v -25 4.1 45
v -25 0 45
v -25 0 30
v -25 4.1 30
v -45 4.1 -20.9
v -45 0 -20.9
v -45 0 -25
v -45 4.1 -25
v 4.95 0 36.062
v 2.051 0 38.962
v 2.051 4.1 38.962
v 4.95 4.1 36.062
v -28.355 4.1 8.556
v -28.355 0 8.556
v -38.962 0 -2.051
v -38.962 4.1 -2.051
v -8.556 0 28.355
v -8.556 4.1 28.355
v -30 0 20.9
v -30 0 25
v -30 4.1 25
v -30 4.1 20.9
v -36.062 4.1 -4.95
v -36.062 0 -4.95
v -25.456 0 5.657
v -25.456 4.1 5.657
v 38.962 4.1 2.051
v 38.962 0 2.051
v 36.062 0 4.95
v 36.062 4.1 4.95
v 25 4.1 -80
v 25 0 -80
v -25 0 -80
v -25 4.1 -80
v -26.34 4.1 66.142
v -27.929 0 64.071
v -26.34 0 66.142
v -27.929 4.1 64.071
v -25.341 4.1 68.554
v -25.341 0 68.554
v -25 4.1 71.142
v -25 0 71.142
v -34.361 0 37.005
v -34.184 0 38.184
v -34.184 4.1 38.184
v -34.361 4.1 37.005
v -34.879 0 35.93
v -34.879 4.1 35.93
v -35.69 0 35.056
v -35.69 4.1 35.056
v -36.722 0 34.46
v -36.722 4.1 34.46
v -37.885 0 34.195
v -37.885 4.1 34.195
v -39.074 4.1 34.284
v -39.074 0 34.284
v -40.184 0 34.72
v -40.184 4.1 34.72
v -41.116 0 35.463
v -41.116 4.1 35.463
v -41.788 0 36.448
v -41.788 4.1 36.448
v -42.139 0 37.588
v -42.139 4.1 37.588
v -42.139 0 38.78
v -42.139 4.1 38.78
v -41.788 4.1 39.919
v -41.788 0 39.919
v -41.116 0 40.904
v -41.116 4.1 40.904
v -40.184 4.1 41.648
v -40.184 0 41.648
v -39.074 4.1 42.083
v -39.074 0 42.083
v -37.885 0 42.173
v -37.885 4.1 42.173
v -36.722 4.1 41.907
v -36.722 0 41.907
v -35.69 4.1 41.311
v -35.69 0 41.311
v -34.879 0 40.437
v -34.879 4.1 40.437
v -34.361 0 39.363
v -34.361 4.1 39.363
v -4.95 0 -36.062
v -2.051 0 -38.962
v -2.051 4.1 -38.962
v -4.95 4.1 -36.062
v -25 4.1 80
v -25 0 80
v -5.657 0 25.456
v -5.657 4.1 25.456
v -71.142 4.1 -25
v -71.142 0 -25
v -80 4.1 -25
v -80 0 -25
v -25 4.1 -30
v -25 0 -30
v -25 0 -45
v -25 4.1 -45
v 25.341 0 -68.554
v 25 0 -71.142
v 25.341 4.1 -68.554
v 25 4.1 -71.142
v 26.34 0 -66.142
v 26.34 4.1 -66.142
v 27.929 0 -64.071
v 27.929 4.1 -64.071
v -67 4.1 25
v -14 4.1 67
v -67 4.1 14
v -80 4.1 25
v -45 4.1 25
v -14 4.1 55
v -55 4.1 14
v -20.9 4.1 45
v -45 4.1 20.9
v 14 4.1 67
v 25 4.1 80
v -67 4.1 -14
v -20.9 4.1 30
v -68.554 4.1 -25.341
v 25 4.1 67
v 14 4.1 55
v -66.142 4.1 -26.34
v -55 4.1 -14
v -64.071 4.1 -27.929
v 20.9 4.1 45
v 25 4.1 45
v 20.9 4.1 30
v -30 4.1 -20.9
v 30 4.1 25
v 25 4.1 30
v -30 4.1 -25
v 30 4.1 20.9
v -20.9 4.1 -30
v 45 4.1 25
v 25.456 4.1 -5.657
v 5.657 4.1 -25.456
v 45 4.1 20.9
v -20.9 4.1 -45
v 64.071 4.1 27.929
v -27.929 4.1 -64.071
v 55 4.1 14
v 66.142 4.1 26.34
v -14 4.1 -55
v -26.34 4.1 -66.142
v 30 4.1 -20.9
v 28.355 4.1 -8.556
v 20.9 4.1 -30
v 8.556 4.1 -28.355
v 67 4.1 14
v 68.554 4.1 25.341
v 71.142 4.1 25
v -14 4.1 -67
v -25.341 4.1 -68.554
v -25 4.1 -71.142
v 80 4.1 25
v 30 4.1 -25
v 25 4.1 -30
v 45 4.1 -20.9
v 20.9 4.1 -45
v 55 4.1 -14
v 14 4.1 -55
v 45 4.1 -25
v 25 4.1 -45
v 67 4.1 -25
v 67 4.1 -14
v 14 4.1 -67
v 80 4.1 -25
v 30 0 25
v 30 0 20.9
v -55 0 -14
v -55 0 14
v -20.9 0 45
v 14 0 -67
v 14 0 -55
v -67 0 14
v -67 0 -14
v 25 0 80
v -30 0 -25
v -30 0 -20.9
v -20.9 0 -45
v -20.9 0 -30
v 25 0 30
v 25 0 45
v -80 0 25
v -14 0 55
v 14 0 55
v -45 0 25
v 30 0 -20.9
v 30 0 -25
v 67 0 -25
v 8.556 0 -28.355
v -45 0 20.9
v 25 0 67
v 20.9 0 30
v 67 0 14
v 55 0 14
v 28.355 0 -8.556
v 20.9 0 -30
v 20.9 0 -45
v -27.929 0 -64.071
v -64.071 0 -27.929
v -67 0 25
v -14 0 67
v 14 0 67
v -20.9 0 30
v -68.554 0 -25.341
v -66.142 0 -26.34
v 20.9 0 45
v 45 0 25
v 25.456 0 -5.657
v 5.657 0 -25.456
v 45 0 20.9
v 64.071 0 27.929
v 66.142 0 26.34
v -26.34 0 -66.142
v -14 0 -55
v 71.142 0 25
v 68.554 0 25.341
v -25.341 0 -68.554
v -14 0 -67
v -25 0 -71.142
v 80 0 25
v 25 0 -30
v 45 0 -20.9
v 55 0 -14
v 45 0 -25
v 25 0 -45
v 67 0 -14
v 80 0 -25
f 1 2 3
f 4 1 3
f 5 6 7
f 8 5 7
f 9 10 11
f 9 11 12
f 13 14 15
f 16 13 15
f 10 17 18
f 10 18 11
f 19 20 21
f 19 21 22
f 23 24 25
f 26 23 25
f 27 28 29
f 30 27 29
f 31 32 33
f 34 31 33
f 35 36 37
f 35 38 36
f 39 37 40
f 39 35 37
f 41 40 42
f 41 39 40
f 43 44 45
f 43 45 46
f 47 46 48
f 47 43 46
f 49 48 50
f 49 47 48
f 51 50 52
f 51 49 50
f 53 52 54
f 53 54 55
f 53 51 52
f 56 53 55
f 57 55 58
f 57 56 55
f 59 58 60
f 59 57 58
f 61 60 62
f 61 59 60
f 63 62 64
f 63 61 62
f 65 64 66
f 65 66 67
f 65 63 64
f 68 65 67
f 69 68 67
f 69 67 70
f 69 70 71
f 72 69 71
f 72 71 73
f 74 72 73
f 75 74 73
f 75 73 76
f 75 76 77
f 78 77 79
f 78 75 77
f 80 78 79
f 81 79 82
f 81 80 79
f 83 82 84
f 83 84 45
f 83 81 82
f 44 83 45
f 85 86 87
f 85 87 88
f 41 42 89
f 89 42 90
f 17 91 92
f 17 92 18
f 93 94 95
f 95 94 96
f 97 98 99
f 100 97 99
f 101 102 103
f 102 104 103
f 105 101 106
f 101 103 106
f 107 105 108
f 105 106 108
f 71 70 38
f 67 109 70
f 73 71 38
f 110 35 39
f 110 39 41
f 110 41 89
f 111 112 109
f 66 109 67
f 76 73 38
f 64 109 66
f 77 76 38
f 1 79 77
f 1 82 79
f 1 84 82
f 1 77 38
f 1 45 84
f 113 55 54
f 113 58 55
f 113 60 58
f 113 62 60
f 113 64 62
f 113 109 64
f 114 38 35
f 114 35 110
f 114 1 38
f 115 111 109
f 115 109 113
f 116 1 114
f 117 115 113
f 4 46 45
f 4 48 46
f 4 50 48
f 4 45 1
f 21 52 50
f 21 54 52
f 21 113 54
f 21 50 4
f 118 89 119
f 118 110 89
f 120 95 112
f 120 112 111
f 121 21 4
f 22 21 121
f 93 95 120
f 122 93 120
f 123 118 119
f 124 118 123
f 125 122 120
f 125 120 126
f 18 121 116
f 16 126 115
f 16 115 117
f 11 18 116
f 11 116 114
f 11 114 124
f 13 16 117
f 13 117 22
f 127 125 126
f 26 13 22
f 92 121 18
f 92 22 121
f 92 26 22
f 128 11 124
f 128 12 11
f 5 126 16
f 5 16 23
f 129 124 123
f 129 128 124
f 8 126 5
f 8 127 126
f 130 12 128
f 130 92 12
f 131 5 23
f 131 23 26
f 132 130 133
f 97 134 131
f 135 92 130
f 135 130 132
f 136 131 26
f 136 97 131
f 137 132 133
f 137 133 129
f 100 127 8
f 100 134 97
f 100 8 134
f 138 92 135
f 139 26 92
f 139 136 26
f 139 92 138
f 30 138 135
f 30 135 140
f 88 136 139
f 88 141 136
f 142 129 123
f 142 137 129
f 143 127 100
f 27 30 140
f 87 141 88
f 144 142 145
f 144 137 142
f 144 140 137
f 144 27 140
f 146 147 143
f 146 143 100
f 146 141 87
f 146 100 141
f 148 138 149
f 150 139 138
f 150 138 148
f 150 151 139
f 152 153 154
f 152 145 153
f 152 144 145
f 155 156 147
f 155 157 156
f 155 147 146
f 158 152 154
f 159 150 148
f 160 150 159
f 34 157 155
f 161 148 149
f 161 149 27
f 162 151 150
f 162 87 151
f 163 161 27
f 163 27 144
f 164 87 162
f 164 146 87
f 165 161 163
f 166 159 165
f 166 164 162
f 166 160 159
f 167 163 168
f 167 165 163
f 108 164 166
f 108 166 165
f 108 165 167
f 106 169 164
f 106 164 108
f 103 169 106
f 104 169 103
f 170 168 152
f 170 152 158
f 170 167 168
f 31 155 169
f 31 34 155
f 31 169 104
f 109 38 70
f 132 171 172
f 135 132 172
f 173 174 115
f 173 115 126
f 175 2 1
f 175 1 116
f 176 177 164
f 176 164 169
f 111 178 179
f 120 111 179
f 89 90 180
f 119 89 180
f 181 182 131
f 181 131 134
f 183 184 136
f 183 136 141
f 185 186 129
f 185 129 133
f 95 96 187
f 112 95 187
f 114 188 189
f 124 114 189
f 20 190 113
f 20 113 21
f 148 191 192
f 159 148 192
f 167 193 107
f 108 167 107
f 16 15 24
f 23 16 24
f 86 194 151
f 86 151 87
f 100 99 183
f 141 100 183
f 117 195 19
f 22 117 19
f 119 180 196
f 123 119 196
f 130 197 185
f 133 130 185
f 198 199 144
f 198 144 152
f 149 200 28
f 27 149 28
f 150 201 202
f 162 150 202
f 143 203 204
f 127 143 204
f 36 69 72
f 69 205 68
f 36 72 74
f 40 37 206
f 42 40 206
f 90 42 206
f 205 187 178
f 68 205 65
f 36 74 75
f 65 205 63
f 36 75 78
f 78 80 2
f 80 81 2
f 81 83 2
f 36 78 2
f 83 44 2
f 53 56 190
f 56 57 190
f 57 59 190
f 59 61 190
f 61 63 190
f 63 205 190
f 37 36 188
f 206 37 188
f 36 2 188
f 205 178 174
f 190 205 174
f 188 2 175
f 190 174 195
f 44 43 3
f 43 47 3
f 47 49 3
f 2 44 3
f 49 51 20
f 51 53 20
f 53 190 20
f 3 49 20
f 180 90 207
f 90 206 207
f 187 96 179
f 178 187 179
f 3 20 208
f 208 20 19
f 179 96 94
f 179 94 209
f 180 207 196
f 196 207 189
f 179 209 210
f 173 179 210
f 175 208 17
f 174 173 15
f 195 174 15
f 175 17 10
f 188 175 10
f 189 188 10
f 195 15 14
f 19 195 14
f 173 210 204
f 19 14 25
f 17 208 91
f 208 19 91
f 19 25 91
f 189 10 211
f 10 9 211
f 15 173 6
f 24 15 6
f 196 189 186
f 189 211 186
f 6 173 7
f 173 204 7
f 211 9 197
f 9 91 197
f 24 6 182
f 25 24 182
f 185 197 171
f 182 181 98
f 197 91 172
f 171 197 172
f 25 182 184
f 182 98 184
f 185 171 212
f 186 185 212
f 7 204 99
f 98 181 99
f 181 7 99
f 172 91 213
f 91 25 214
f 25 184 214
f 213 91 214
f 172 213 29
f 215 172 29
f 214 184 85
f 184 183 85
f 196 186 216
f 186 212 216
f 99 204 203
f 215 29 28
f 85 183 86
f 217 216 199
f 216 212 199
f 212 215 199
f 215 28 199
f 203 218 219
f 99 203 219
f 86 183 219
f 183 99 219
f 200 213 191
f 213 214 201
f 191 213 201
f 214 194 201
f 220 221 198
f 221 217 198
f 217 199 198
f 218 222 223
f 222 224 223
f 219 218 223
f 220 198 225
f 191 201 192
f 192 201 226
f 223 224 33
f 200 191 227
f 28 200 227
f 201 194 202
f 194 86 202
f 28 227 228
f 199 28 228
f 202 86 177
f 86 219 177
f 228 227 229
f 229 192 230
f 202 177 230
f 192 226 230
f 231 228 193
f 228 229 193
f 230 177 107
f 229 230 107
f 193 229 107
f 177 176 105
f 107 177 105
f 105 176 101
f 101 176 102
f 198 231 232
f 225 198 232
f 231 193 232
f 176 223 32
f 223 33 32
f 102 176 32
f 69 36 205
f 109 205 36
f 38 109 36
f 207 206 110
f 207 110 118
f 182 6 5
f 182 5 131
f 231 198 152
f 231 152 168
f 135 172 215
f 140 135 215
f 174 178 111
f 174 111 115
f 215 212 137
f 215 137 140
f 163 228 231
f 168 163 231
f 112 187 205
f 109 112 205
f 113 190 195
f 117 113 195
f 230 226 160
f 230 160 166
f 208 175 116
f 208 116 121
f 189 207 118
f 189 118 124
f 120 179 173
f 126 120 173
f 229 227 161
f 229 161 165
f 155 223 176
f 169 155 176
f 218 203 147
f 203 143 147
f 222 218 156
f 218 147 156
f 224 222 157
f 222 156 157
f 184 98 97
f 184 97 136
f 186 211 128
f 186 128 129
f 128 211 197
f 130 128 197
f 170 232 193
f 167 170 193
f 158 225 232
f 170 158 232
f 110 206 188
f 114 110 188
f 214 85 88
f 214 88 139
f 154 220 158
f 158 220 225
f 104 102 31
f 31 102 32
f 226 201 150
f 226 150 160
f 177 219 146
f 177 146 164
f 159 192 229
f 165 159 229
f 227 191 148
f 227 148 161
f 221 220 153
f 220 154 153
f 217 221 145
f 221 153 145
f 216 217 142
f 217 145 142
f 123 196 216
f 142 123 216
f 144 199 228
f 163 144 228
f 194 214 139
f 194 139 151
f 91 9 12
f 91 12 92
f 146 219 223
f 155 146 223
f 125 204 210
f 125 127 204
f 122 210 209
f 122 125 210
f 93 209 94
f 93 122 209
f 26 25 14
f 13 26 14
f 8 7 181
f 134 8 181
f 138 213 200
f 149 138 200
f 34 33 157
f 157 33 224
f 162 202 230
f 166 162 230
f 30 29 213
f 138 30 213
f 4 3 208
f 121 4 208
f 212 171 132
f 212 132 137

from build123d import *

# Parameters (mm, degrees)
SKETCH1_R           = 4
SKETCH1_W           = 4.1
SKETCH1_H           = 15
SKETCH1_W_2         = 15
SKETCH1_H_2         = 4.1
SKETCH1_W_3         = 12
SKETCH1_H_3         = 28
SKETCH1_W_4         = 28
SKETCH1_H_4         = 12
BOSS_EXTRUDE1_DEPTH = 4.1
FILLET4_R           = 10


with BuildPart() as part:
    # Sketch1 → Boss-Extrude1 (new body)
    with BuildSketch(Plane(origin=(0, 0, 0), x_dir=(1, 0, 0), z_dir=(0, 1, 0))):
        Polygon((-25, 67), (-67, 25), (-80, 25), (-80, -25), (-67, -25), (-25, -67), (-25, -80), (25, -80), (25, -67), (67, -25), (80, -25), (80, 25), (67, 25), (25, 67), (25, 80), (-25, 80), align=None)
        with Locations((-38.183766184, -38.183766184)):
            Circle(SKETCH1_R, mode=Mode.SUBTRACT)
        with Locations((-22.95, 37.5)):
            Rectangle(SKETCH1_W, SKETCH1_H, mode=Mode.SUBTRACT)
        with Locations((-37.5, 22.95)):
            Rectangle(SKETCH1_W_2, SKETCH1_H_2, mode=Mode.SUBTRACT)
        with Locations((37.5, -22.95)):
            Rectangle(SKETCH1_W_2, SKETCH1_H_2, mode=Mode.SUBTRACT)
        with Locations((22.95, -37.5)):
            Rectangle(SKETCH1_W, SKETCH1_H, mode=Mode.SUBTRACT)
        with Locations((37.5, 22.95)):
            Rectangle(SKETCH1_W_2, SKETCH1_H_2, mode=Mode.SUBTRACT)
        with Locations((-37.5, -22.95)):
            Rectangle(SKETCH1_W_2, SKETCH1_H_2, mode=Mode.SUBTRACT)
        with Locations((22.95, 37.5)):
            Rectangle(SKETCH1_W, SKETCH1_H, mode=Mode.SUBTRACT)
        with Locations((-22.95, -37.5)):
            Rectangle(SKETCH1_W, SKETCH1_H, mode=Mode.SUBTRACT)
        Polygon((-36.062445841, 4.949747468), (-25.455844123, -5.656854249), (-28.354981926, -8.555992052), (-38.961583643, 2.050609665), align=None, mode=Mode.SUBTRACT)
        Polygon((-8.555992052, -28.354981926), (2.050609665, -38.961583643), (4.949747468, -36.062445841), (-5.656854249, -25.455844123), align=None, mode=Mode.SUBTRACT)
        with Locations((-61, 0)):
            Rectangle(SKETCH1_W_3, SKETCH1_H_3, mode=Mode.SUBTRACT)
        with Locations((61, 0)):
            Rectangle(SKETCH1_W_3, SKETCH1_H_3, mode=Mode.SUBTRACT)
        with Locations((0, 61)):
            Rectangle(SKETCH1_W_4, SKETCH1_H_4, mode=Mode.SUBTRACT)
        with Locations((0, -61)):
            Rectangle(SKETCH1_W_4, SKETCH1_H_4, mode=Mode.SUBTRACT)
        Polygon((38.961583643, -2.050609665), (36.062445841, -4.949747468), (25.455844123, 5.656854249), (28.354981926, 8.555992052), align=None, mode=Mode.SUBTRACT)
        Polygon((8.555992052, 28.354981926), (-2.050609665, 38.961583643), (-4.949747468, 36.062445841), (5.656854249, 25.455844123), align=None, mode=Mode.SUBTRACT)
    extrude(amount=BOSS_EXTRUDE1_DEPTH)

    # Fillet4
    fillet4_edges = [part.edges().sort_by_distance(p)[0] for p in [
        (-25, 2.05, 67),
        (-67, 2.05, -25),
        (-25, 2.05, -67),
        (25, 2.05, -67),
        (67, 2.05, 25),
    ]]
    fillet(fillet4_edges, radius=FILLET4_R)


solid = part.part
